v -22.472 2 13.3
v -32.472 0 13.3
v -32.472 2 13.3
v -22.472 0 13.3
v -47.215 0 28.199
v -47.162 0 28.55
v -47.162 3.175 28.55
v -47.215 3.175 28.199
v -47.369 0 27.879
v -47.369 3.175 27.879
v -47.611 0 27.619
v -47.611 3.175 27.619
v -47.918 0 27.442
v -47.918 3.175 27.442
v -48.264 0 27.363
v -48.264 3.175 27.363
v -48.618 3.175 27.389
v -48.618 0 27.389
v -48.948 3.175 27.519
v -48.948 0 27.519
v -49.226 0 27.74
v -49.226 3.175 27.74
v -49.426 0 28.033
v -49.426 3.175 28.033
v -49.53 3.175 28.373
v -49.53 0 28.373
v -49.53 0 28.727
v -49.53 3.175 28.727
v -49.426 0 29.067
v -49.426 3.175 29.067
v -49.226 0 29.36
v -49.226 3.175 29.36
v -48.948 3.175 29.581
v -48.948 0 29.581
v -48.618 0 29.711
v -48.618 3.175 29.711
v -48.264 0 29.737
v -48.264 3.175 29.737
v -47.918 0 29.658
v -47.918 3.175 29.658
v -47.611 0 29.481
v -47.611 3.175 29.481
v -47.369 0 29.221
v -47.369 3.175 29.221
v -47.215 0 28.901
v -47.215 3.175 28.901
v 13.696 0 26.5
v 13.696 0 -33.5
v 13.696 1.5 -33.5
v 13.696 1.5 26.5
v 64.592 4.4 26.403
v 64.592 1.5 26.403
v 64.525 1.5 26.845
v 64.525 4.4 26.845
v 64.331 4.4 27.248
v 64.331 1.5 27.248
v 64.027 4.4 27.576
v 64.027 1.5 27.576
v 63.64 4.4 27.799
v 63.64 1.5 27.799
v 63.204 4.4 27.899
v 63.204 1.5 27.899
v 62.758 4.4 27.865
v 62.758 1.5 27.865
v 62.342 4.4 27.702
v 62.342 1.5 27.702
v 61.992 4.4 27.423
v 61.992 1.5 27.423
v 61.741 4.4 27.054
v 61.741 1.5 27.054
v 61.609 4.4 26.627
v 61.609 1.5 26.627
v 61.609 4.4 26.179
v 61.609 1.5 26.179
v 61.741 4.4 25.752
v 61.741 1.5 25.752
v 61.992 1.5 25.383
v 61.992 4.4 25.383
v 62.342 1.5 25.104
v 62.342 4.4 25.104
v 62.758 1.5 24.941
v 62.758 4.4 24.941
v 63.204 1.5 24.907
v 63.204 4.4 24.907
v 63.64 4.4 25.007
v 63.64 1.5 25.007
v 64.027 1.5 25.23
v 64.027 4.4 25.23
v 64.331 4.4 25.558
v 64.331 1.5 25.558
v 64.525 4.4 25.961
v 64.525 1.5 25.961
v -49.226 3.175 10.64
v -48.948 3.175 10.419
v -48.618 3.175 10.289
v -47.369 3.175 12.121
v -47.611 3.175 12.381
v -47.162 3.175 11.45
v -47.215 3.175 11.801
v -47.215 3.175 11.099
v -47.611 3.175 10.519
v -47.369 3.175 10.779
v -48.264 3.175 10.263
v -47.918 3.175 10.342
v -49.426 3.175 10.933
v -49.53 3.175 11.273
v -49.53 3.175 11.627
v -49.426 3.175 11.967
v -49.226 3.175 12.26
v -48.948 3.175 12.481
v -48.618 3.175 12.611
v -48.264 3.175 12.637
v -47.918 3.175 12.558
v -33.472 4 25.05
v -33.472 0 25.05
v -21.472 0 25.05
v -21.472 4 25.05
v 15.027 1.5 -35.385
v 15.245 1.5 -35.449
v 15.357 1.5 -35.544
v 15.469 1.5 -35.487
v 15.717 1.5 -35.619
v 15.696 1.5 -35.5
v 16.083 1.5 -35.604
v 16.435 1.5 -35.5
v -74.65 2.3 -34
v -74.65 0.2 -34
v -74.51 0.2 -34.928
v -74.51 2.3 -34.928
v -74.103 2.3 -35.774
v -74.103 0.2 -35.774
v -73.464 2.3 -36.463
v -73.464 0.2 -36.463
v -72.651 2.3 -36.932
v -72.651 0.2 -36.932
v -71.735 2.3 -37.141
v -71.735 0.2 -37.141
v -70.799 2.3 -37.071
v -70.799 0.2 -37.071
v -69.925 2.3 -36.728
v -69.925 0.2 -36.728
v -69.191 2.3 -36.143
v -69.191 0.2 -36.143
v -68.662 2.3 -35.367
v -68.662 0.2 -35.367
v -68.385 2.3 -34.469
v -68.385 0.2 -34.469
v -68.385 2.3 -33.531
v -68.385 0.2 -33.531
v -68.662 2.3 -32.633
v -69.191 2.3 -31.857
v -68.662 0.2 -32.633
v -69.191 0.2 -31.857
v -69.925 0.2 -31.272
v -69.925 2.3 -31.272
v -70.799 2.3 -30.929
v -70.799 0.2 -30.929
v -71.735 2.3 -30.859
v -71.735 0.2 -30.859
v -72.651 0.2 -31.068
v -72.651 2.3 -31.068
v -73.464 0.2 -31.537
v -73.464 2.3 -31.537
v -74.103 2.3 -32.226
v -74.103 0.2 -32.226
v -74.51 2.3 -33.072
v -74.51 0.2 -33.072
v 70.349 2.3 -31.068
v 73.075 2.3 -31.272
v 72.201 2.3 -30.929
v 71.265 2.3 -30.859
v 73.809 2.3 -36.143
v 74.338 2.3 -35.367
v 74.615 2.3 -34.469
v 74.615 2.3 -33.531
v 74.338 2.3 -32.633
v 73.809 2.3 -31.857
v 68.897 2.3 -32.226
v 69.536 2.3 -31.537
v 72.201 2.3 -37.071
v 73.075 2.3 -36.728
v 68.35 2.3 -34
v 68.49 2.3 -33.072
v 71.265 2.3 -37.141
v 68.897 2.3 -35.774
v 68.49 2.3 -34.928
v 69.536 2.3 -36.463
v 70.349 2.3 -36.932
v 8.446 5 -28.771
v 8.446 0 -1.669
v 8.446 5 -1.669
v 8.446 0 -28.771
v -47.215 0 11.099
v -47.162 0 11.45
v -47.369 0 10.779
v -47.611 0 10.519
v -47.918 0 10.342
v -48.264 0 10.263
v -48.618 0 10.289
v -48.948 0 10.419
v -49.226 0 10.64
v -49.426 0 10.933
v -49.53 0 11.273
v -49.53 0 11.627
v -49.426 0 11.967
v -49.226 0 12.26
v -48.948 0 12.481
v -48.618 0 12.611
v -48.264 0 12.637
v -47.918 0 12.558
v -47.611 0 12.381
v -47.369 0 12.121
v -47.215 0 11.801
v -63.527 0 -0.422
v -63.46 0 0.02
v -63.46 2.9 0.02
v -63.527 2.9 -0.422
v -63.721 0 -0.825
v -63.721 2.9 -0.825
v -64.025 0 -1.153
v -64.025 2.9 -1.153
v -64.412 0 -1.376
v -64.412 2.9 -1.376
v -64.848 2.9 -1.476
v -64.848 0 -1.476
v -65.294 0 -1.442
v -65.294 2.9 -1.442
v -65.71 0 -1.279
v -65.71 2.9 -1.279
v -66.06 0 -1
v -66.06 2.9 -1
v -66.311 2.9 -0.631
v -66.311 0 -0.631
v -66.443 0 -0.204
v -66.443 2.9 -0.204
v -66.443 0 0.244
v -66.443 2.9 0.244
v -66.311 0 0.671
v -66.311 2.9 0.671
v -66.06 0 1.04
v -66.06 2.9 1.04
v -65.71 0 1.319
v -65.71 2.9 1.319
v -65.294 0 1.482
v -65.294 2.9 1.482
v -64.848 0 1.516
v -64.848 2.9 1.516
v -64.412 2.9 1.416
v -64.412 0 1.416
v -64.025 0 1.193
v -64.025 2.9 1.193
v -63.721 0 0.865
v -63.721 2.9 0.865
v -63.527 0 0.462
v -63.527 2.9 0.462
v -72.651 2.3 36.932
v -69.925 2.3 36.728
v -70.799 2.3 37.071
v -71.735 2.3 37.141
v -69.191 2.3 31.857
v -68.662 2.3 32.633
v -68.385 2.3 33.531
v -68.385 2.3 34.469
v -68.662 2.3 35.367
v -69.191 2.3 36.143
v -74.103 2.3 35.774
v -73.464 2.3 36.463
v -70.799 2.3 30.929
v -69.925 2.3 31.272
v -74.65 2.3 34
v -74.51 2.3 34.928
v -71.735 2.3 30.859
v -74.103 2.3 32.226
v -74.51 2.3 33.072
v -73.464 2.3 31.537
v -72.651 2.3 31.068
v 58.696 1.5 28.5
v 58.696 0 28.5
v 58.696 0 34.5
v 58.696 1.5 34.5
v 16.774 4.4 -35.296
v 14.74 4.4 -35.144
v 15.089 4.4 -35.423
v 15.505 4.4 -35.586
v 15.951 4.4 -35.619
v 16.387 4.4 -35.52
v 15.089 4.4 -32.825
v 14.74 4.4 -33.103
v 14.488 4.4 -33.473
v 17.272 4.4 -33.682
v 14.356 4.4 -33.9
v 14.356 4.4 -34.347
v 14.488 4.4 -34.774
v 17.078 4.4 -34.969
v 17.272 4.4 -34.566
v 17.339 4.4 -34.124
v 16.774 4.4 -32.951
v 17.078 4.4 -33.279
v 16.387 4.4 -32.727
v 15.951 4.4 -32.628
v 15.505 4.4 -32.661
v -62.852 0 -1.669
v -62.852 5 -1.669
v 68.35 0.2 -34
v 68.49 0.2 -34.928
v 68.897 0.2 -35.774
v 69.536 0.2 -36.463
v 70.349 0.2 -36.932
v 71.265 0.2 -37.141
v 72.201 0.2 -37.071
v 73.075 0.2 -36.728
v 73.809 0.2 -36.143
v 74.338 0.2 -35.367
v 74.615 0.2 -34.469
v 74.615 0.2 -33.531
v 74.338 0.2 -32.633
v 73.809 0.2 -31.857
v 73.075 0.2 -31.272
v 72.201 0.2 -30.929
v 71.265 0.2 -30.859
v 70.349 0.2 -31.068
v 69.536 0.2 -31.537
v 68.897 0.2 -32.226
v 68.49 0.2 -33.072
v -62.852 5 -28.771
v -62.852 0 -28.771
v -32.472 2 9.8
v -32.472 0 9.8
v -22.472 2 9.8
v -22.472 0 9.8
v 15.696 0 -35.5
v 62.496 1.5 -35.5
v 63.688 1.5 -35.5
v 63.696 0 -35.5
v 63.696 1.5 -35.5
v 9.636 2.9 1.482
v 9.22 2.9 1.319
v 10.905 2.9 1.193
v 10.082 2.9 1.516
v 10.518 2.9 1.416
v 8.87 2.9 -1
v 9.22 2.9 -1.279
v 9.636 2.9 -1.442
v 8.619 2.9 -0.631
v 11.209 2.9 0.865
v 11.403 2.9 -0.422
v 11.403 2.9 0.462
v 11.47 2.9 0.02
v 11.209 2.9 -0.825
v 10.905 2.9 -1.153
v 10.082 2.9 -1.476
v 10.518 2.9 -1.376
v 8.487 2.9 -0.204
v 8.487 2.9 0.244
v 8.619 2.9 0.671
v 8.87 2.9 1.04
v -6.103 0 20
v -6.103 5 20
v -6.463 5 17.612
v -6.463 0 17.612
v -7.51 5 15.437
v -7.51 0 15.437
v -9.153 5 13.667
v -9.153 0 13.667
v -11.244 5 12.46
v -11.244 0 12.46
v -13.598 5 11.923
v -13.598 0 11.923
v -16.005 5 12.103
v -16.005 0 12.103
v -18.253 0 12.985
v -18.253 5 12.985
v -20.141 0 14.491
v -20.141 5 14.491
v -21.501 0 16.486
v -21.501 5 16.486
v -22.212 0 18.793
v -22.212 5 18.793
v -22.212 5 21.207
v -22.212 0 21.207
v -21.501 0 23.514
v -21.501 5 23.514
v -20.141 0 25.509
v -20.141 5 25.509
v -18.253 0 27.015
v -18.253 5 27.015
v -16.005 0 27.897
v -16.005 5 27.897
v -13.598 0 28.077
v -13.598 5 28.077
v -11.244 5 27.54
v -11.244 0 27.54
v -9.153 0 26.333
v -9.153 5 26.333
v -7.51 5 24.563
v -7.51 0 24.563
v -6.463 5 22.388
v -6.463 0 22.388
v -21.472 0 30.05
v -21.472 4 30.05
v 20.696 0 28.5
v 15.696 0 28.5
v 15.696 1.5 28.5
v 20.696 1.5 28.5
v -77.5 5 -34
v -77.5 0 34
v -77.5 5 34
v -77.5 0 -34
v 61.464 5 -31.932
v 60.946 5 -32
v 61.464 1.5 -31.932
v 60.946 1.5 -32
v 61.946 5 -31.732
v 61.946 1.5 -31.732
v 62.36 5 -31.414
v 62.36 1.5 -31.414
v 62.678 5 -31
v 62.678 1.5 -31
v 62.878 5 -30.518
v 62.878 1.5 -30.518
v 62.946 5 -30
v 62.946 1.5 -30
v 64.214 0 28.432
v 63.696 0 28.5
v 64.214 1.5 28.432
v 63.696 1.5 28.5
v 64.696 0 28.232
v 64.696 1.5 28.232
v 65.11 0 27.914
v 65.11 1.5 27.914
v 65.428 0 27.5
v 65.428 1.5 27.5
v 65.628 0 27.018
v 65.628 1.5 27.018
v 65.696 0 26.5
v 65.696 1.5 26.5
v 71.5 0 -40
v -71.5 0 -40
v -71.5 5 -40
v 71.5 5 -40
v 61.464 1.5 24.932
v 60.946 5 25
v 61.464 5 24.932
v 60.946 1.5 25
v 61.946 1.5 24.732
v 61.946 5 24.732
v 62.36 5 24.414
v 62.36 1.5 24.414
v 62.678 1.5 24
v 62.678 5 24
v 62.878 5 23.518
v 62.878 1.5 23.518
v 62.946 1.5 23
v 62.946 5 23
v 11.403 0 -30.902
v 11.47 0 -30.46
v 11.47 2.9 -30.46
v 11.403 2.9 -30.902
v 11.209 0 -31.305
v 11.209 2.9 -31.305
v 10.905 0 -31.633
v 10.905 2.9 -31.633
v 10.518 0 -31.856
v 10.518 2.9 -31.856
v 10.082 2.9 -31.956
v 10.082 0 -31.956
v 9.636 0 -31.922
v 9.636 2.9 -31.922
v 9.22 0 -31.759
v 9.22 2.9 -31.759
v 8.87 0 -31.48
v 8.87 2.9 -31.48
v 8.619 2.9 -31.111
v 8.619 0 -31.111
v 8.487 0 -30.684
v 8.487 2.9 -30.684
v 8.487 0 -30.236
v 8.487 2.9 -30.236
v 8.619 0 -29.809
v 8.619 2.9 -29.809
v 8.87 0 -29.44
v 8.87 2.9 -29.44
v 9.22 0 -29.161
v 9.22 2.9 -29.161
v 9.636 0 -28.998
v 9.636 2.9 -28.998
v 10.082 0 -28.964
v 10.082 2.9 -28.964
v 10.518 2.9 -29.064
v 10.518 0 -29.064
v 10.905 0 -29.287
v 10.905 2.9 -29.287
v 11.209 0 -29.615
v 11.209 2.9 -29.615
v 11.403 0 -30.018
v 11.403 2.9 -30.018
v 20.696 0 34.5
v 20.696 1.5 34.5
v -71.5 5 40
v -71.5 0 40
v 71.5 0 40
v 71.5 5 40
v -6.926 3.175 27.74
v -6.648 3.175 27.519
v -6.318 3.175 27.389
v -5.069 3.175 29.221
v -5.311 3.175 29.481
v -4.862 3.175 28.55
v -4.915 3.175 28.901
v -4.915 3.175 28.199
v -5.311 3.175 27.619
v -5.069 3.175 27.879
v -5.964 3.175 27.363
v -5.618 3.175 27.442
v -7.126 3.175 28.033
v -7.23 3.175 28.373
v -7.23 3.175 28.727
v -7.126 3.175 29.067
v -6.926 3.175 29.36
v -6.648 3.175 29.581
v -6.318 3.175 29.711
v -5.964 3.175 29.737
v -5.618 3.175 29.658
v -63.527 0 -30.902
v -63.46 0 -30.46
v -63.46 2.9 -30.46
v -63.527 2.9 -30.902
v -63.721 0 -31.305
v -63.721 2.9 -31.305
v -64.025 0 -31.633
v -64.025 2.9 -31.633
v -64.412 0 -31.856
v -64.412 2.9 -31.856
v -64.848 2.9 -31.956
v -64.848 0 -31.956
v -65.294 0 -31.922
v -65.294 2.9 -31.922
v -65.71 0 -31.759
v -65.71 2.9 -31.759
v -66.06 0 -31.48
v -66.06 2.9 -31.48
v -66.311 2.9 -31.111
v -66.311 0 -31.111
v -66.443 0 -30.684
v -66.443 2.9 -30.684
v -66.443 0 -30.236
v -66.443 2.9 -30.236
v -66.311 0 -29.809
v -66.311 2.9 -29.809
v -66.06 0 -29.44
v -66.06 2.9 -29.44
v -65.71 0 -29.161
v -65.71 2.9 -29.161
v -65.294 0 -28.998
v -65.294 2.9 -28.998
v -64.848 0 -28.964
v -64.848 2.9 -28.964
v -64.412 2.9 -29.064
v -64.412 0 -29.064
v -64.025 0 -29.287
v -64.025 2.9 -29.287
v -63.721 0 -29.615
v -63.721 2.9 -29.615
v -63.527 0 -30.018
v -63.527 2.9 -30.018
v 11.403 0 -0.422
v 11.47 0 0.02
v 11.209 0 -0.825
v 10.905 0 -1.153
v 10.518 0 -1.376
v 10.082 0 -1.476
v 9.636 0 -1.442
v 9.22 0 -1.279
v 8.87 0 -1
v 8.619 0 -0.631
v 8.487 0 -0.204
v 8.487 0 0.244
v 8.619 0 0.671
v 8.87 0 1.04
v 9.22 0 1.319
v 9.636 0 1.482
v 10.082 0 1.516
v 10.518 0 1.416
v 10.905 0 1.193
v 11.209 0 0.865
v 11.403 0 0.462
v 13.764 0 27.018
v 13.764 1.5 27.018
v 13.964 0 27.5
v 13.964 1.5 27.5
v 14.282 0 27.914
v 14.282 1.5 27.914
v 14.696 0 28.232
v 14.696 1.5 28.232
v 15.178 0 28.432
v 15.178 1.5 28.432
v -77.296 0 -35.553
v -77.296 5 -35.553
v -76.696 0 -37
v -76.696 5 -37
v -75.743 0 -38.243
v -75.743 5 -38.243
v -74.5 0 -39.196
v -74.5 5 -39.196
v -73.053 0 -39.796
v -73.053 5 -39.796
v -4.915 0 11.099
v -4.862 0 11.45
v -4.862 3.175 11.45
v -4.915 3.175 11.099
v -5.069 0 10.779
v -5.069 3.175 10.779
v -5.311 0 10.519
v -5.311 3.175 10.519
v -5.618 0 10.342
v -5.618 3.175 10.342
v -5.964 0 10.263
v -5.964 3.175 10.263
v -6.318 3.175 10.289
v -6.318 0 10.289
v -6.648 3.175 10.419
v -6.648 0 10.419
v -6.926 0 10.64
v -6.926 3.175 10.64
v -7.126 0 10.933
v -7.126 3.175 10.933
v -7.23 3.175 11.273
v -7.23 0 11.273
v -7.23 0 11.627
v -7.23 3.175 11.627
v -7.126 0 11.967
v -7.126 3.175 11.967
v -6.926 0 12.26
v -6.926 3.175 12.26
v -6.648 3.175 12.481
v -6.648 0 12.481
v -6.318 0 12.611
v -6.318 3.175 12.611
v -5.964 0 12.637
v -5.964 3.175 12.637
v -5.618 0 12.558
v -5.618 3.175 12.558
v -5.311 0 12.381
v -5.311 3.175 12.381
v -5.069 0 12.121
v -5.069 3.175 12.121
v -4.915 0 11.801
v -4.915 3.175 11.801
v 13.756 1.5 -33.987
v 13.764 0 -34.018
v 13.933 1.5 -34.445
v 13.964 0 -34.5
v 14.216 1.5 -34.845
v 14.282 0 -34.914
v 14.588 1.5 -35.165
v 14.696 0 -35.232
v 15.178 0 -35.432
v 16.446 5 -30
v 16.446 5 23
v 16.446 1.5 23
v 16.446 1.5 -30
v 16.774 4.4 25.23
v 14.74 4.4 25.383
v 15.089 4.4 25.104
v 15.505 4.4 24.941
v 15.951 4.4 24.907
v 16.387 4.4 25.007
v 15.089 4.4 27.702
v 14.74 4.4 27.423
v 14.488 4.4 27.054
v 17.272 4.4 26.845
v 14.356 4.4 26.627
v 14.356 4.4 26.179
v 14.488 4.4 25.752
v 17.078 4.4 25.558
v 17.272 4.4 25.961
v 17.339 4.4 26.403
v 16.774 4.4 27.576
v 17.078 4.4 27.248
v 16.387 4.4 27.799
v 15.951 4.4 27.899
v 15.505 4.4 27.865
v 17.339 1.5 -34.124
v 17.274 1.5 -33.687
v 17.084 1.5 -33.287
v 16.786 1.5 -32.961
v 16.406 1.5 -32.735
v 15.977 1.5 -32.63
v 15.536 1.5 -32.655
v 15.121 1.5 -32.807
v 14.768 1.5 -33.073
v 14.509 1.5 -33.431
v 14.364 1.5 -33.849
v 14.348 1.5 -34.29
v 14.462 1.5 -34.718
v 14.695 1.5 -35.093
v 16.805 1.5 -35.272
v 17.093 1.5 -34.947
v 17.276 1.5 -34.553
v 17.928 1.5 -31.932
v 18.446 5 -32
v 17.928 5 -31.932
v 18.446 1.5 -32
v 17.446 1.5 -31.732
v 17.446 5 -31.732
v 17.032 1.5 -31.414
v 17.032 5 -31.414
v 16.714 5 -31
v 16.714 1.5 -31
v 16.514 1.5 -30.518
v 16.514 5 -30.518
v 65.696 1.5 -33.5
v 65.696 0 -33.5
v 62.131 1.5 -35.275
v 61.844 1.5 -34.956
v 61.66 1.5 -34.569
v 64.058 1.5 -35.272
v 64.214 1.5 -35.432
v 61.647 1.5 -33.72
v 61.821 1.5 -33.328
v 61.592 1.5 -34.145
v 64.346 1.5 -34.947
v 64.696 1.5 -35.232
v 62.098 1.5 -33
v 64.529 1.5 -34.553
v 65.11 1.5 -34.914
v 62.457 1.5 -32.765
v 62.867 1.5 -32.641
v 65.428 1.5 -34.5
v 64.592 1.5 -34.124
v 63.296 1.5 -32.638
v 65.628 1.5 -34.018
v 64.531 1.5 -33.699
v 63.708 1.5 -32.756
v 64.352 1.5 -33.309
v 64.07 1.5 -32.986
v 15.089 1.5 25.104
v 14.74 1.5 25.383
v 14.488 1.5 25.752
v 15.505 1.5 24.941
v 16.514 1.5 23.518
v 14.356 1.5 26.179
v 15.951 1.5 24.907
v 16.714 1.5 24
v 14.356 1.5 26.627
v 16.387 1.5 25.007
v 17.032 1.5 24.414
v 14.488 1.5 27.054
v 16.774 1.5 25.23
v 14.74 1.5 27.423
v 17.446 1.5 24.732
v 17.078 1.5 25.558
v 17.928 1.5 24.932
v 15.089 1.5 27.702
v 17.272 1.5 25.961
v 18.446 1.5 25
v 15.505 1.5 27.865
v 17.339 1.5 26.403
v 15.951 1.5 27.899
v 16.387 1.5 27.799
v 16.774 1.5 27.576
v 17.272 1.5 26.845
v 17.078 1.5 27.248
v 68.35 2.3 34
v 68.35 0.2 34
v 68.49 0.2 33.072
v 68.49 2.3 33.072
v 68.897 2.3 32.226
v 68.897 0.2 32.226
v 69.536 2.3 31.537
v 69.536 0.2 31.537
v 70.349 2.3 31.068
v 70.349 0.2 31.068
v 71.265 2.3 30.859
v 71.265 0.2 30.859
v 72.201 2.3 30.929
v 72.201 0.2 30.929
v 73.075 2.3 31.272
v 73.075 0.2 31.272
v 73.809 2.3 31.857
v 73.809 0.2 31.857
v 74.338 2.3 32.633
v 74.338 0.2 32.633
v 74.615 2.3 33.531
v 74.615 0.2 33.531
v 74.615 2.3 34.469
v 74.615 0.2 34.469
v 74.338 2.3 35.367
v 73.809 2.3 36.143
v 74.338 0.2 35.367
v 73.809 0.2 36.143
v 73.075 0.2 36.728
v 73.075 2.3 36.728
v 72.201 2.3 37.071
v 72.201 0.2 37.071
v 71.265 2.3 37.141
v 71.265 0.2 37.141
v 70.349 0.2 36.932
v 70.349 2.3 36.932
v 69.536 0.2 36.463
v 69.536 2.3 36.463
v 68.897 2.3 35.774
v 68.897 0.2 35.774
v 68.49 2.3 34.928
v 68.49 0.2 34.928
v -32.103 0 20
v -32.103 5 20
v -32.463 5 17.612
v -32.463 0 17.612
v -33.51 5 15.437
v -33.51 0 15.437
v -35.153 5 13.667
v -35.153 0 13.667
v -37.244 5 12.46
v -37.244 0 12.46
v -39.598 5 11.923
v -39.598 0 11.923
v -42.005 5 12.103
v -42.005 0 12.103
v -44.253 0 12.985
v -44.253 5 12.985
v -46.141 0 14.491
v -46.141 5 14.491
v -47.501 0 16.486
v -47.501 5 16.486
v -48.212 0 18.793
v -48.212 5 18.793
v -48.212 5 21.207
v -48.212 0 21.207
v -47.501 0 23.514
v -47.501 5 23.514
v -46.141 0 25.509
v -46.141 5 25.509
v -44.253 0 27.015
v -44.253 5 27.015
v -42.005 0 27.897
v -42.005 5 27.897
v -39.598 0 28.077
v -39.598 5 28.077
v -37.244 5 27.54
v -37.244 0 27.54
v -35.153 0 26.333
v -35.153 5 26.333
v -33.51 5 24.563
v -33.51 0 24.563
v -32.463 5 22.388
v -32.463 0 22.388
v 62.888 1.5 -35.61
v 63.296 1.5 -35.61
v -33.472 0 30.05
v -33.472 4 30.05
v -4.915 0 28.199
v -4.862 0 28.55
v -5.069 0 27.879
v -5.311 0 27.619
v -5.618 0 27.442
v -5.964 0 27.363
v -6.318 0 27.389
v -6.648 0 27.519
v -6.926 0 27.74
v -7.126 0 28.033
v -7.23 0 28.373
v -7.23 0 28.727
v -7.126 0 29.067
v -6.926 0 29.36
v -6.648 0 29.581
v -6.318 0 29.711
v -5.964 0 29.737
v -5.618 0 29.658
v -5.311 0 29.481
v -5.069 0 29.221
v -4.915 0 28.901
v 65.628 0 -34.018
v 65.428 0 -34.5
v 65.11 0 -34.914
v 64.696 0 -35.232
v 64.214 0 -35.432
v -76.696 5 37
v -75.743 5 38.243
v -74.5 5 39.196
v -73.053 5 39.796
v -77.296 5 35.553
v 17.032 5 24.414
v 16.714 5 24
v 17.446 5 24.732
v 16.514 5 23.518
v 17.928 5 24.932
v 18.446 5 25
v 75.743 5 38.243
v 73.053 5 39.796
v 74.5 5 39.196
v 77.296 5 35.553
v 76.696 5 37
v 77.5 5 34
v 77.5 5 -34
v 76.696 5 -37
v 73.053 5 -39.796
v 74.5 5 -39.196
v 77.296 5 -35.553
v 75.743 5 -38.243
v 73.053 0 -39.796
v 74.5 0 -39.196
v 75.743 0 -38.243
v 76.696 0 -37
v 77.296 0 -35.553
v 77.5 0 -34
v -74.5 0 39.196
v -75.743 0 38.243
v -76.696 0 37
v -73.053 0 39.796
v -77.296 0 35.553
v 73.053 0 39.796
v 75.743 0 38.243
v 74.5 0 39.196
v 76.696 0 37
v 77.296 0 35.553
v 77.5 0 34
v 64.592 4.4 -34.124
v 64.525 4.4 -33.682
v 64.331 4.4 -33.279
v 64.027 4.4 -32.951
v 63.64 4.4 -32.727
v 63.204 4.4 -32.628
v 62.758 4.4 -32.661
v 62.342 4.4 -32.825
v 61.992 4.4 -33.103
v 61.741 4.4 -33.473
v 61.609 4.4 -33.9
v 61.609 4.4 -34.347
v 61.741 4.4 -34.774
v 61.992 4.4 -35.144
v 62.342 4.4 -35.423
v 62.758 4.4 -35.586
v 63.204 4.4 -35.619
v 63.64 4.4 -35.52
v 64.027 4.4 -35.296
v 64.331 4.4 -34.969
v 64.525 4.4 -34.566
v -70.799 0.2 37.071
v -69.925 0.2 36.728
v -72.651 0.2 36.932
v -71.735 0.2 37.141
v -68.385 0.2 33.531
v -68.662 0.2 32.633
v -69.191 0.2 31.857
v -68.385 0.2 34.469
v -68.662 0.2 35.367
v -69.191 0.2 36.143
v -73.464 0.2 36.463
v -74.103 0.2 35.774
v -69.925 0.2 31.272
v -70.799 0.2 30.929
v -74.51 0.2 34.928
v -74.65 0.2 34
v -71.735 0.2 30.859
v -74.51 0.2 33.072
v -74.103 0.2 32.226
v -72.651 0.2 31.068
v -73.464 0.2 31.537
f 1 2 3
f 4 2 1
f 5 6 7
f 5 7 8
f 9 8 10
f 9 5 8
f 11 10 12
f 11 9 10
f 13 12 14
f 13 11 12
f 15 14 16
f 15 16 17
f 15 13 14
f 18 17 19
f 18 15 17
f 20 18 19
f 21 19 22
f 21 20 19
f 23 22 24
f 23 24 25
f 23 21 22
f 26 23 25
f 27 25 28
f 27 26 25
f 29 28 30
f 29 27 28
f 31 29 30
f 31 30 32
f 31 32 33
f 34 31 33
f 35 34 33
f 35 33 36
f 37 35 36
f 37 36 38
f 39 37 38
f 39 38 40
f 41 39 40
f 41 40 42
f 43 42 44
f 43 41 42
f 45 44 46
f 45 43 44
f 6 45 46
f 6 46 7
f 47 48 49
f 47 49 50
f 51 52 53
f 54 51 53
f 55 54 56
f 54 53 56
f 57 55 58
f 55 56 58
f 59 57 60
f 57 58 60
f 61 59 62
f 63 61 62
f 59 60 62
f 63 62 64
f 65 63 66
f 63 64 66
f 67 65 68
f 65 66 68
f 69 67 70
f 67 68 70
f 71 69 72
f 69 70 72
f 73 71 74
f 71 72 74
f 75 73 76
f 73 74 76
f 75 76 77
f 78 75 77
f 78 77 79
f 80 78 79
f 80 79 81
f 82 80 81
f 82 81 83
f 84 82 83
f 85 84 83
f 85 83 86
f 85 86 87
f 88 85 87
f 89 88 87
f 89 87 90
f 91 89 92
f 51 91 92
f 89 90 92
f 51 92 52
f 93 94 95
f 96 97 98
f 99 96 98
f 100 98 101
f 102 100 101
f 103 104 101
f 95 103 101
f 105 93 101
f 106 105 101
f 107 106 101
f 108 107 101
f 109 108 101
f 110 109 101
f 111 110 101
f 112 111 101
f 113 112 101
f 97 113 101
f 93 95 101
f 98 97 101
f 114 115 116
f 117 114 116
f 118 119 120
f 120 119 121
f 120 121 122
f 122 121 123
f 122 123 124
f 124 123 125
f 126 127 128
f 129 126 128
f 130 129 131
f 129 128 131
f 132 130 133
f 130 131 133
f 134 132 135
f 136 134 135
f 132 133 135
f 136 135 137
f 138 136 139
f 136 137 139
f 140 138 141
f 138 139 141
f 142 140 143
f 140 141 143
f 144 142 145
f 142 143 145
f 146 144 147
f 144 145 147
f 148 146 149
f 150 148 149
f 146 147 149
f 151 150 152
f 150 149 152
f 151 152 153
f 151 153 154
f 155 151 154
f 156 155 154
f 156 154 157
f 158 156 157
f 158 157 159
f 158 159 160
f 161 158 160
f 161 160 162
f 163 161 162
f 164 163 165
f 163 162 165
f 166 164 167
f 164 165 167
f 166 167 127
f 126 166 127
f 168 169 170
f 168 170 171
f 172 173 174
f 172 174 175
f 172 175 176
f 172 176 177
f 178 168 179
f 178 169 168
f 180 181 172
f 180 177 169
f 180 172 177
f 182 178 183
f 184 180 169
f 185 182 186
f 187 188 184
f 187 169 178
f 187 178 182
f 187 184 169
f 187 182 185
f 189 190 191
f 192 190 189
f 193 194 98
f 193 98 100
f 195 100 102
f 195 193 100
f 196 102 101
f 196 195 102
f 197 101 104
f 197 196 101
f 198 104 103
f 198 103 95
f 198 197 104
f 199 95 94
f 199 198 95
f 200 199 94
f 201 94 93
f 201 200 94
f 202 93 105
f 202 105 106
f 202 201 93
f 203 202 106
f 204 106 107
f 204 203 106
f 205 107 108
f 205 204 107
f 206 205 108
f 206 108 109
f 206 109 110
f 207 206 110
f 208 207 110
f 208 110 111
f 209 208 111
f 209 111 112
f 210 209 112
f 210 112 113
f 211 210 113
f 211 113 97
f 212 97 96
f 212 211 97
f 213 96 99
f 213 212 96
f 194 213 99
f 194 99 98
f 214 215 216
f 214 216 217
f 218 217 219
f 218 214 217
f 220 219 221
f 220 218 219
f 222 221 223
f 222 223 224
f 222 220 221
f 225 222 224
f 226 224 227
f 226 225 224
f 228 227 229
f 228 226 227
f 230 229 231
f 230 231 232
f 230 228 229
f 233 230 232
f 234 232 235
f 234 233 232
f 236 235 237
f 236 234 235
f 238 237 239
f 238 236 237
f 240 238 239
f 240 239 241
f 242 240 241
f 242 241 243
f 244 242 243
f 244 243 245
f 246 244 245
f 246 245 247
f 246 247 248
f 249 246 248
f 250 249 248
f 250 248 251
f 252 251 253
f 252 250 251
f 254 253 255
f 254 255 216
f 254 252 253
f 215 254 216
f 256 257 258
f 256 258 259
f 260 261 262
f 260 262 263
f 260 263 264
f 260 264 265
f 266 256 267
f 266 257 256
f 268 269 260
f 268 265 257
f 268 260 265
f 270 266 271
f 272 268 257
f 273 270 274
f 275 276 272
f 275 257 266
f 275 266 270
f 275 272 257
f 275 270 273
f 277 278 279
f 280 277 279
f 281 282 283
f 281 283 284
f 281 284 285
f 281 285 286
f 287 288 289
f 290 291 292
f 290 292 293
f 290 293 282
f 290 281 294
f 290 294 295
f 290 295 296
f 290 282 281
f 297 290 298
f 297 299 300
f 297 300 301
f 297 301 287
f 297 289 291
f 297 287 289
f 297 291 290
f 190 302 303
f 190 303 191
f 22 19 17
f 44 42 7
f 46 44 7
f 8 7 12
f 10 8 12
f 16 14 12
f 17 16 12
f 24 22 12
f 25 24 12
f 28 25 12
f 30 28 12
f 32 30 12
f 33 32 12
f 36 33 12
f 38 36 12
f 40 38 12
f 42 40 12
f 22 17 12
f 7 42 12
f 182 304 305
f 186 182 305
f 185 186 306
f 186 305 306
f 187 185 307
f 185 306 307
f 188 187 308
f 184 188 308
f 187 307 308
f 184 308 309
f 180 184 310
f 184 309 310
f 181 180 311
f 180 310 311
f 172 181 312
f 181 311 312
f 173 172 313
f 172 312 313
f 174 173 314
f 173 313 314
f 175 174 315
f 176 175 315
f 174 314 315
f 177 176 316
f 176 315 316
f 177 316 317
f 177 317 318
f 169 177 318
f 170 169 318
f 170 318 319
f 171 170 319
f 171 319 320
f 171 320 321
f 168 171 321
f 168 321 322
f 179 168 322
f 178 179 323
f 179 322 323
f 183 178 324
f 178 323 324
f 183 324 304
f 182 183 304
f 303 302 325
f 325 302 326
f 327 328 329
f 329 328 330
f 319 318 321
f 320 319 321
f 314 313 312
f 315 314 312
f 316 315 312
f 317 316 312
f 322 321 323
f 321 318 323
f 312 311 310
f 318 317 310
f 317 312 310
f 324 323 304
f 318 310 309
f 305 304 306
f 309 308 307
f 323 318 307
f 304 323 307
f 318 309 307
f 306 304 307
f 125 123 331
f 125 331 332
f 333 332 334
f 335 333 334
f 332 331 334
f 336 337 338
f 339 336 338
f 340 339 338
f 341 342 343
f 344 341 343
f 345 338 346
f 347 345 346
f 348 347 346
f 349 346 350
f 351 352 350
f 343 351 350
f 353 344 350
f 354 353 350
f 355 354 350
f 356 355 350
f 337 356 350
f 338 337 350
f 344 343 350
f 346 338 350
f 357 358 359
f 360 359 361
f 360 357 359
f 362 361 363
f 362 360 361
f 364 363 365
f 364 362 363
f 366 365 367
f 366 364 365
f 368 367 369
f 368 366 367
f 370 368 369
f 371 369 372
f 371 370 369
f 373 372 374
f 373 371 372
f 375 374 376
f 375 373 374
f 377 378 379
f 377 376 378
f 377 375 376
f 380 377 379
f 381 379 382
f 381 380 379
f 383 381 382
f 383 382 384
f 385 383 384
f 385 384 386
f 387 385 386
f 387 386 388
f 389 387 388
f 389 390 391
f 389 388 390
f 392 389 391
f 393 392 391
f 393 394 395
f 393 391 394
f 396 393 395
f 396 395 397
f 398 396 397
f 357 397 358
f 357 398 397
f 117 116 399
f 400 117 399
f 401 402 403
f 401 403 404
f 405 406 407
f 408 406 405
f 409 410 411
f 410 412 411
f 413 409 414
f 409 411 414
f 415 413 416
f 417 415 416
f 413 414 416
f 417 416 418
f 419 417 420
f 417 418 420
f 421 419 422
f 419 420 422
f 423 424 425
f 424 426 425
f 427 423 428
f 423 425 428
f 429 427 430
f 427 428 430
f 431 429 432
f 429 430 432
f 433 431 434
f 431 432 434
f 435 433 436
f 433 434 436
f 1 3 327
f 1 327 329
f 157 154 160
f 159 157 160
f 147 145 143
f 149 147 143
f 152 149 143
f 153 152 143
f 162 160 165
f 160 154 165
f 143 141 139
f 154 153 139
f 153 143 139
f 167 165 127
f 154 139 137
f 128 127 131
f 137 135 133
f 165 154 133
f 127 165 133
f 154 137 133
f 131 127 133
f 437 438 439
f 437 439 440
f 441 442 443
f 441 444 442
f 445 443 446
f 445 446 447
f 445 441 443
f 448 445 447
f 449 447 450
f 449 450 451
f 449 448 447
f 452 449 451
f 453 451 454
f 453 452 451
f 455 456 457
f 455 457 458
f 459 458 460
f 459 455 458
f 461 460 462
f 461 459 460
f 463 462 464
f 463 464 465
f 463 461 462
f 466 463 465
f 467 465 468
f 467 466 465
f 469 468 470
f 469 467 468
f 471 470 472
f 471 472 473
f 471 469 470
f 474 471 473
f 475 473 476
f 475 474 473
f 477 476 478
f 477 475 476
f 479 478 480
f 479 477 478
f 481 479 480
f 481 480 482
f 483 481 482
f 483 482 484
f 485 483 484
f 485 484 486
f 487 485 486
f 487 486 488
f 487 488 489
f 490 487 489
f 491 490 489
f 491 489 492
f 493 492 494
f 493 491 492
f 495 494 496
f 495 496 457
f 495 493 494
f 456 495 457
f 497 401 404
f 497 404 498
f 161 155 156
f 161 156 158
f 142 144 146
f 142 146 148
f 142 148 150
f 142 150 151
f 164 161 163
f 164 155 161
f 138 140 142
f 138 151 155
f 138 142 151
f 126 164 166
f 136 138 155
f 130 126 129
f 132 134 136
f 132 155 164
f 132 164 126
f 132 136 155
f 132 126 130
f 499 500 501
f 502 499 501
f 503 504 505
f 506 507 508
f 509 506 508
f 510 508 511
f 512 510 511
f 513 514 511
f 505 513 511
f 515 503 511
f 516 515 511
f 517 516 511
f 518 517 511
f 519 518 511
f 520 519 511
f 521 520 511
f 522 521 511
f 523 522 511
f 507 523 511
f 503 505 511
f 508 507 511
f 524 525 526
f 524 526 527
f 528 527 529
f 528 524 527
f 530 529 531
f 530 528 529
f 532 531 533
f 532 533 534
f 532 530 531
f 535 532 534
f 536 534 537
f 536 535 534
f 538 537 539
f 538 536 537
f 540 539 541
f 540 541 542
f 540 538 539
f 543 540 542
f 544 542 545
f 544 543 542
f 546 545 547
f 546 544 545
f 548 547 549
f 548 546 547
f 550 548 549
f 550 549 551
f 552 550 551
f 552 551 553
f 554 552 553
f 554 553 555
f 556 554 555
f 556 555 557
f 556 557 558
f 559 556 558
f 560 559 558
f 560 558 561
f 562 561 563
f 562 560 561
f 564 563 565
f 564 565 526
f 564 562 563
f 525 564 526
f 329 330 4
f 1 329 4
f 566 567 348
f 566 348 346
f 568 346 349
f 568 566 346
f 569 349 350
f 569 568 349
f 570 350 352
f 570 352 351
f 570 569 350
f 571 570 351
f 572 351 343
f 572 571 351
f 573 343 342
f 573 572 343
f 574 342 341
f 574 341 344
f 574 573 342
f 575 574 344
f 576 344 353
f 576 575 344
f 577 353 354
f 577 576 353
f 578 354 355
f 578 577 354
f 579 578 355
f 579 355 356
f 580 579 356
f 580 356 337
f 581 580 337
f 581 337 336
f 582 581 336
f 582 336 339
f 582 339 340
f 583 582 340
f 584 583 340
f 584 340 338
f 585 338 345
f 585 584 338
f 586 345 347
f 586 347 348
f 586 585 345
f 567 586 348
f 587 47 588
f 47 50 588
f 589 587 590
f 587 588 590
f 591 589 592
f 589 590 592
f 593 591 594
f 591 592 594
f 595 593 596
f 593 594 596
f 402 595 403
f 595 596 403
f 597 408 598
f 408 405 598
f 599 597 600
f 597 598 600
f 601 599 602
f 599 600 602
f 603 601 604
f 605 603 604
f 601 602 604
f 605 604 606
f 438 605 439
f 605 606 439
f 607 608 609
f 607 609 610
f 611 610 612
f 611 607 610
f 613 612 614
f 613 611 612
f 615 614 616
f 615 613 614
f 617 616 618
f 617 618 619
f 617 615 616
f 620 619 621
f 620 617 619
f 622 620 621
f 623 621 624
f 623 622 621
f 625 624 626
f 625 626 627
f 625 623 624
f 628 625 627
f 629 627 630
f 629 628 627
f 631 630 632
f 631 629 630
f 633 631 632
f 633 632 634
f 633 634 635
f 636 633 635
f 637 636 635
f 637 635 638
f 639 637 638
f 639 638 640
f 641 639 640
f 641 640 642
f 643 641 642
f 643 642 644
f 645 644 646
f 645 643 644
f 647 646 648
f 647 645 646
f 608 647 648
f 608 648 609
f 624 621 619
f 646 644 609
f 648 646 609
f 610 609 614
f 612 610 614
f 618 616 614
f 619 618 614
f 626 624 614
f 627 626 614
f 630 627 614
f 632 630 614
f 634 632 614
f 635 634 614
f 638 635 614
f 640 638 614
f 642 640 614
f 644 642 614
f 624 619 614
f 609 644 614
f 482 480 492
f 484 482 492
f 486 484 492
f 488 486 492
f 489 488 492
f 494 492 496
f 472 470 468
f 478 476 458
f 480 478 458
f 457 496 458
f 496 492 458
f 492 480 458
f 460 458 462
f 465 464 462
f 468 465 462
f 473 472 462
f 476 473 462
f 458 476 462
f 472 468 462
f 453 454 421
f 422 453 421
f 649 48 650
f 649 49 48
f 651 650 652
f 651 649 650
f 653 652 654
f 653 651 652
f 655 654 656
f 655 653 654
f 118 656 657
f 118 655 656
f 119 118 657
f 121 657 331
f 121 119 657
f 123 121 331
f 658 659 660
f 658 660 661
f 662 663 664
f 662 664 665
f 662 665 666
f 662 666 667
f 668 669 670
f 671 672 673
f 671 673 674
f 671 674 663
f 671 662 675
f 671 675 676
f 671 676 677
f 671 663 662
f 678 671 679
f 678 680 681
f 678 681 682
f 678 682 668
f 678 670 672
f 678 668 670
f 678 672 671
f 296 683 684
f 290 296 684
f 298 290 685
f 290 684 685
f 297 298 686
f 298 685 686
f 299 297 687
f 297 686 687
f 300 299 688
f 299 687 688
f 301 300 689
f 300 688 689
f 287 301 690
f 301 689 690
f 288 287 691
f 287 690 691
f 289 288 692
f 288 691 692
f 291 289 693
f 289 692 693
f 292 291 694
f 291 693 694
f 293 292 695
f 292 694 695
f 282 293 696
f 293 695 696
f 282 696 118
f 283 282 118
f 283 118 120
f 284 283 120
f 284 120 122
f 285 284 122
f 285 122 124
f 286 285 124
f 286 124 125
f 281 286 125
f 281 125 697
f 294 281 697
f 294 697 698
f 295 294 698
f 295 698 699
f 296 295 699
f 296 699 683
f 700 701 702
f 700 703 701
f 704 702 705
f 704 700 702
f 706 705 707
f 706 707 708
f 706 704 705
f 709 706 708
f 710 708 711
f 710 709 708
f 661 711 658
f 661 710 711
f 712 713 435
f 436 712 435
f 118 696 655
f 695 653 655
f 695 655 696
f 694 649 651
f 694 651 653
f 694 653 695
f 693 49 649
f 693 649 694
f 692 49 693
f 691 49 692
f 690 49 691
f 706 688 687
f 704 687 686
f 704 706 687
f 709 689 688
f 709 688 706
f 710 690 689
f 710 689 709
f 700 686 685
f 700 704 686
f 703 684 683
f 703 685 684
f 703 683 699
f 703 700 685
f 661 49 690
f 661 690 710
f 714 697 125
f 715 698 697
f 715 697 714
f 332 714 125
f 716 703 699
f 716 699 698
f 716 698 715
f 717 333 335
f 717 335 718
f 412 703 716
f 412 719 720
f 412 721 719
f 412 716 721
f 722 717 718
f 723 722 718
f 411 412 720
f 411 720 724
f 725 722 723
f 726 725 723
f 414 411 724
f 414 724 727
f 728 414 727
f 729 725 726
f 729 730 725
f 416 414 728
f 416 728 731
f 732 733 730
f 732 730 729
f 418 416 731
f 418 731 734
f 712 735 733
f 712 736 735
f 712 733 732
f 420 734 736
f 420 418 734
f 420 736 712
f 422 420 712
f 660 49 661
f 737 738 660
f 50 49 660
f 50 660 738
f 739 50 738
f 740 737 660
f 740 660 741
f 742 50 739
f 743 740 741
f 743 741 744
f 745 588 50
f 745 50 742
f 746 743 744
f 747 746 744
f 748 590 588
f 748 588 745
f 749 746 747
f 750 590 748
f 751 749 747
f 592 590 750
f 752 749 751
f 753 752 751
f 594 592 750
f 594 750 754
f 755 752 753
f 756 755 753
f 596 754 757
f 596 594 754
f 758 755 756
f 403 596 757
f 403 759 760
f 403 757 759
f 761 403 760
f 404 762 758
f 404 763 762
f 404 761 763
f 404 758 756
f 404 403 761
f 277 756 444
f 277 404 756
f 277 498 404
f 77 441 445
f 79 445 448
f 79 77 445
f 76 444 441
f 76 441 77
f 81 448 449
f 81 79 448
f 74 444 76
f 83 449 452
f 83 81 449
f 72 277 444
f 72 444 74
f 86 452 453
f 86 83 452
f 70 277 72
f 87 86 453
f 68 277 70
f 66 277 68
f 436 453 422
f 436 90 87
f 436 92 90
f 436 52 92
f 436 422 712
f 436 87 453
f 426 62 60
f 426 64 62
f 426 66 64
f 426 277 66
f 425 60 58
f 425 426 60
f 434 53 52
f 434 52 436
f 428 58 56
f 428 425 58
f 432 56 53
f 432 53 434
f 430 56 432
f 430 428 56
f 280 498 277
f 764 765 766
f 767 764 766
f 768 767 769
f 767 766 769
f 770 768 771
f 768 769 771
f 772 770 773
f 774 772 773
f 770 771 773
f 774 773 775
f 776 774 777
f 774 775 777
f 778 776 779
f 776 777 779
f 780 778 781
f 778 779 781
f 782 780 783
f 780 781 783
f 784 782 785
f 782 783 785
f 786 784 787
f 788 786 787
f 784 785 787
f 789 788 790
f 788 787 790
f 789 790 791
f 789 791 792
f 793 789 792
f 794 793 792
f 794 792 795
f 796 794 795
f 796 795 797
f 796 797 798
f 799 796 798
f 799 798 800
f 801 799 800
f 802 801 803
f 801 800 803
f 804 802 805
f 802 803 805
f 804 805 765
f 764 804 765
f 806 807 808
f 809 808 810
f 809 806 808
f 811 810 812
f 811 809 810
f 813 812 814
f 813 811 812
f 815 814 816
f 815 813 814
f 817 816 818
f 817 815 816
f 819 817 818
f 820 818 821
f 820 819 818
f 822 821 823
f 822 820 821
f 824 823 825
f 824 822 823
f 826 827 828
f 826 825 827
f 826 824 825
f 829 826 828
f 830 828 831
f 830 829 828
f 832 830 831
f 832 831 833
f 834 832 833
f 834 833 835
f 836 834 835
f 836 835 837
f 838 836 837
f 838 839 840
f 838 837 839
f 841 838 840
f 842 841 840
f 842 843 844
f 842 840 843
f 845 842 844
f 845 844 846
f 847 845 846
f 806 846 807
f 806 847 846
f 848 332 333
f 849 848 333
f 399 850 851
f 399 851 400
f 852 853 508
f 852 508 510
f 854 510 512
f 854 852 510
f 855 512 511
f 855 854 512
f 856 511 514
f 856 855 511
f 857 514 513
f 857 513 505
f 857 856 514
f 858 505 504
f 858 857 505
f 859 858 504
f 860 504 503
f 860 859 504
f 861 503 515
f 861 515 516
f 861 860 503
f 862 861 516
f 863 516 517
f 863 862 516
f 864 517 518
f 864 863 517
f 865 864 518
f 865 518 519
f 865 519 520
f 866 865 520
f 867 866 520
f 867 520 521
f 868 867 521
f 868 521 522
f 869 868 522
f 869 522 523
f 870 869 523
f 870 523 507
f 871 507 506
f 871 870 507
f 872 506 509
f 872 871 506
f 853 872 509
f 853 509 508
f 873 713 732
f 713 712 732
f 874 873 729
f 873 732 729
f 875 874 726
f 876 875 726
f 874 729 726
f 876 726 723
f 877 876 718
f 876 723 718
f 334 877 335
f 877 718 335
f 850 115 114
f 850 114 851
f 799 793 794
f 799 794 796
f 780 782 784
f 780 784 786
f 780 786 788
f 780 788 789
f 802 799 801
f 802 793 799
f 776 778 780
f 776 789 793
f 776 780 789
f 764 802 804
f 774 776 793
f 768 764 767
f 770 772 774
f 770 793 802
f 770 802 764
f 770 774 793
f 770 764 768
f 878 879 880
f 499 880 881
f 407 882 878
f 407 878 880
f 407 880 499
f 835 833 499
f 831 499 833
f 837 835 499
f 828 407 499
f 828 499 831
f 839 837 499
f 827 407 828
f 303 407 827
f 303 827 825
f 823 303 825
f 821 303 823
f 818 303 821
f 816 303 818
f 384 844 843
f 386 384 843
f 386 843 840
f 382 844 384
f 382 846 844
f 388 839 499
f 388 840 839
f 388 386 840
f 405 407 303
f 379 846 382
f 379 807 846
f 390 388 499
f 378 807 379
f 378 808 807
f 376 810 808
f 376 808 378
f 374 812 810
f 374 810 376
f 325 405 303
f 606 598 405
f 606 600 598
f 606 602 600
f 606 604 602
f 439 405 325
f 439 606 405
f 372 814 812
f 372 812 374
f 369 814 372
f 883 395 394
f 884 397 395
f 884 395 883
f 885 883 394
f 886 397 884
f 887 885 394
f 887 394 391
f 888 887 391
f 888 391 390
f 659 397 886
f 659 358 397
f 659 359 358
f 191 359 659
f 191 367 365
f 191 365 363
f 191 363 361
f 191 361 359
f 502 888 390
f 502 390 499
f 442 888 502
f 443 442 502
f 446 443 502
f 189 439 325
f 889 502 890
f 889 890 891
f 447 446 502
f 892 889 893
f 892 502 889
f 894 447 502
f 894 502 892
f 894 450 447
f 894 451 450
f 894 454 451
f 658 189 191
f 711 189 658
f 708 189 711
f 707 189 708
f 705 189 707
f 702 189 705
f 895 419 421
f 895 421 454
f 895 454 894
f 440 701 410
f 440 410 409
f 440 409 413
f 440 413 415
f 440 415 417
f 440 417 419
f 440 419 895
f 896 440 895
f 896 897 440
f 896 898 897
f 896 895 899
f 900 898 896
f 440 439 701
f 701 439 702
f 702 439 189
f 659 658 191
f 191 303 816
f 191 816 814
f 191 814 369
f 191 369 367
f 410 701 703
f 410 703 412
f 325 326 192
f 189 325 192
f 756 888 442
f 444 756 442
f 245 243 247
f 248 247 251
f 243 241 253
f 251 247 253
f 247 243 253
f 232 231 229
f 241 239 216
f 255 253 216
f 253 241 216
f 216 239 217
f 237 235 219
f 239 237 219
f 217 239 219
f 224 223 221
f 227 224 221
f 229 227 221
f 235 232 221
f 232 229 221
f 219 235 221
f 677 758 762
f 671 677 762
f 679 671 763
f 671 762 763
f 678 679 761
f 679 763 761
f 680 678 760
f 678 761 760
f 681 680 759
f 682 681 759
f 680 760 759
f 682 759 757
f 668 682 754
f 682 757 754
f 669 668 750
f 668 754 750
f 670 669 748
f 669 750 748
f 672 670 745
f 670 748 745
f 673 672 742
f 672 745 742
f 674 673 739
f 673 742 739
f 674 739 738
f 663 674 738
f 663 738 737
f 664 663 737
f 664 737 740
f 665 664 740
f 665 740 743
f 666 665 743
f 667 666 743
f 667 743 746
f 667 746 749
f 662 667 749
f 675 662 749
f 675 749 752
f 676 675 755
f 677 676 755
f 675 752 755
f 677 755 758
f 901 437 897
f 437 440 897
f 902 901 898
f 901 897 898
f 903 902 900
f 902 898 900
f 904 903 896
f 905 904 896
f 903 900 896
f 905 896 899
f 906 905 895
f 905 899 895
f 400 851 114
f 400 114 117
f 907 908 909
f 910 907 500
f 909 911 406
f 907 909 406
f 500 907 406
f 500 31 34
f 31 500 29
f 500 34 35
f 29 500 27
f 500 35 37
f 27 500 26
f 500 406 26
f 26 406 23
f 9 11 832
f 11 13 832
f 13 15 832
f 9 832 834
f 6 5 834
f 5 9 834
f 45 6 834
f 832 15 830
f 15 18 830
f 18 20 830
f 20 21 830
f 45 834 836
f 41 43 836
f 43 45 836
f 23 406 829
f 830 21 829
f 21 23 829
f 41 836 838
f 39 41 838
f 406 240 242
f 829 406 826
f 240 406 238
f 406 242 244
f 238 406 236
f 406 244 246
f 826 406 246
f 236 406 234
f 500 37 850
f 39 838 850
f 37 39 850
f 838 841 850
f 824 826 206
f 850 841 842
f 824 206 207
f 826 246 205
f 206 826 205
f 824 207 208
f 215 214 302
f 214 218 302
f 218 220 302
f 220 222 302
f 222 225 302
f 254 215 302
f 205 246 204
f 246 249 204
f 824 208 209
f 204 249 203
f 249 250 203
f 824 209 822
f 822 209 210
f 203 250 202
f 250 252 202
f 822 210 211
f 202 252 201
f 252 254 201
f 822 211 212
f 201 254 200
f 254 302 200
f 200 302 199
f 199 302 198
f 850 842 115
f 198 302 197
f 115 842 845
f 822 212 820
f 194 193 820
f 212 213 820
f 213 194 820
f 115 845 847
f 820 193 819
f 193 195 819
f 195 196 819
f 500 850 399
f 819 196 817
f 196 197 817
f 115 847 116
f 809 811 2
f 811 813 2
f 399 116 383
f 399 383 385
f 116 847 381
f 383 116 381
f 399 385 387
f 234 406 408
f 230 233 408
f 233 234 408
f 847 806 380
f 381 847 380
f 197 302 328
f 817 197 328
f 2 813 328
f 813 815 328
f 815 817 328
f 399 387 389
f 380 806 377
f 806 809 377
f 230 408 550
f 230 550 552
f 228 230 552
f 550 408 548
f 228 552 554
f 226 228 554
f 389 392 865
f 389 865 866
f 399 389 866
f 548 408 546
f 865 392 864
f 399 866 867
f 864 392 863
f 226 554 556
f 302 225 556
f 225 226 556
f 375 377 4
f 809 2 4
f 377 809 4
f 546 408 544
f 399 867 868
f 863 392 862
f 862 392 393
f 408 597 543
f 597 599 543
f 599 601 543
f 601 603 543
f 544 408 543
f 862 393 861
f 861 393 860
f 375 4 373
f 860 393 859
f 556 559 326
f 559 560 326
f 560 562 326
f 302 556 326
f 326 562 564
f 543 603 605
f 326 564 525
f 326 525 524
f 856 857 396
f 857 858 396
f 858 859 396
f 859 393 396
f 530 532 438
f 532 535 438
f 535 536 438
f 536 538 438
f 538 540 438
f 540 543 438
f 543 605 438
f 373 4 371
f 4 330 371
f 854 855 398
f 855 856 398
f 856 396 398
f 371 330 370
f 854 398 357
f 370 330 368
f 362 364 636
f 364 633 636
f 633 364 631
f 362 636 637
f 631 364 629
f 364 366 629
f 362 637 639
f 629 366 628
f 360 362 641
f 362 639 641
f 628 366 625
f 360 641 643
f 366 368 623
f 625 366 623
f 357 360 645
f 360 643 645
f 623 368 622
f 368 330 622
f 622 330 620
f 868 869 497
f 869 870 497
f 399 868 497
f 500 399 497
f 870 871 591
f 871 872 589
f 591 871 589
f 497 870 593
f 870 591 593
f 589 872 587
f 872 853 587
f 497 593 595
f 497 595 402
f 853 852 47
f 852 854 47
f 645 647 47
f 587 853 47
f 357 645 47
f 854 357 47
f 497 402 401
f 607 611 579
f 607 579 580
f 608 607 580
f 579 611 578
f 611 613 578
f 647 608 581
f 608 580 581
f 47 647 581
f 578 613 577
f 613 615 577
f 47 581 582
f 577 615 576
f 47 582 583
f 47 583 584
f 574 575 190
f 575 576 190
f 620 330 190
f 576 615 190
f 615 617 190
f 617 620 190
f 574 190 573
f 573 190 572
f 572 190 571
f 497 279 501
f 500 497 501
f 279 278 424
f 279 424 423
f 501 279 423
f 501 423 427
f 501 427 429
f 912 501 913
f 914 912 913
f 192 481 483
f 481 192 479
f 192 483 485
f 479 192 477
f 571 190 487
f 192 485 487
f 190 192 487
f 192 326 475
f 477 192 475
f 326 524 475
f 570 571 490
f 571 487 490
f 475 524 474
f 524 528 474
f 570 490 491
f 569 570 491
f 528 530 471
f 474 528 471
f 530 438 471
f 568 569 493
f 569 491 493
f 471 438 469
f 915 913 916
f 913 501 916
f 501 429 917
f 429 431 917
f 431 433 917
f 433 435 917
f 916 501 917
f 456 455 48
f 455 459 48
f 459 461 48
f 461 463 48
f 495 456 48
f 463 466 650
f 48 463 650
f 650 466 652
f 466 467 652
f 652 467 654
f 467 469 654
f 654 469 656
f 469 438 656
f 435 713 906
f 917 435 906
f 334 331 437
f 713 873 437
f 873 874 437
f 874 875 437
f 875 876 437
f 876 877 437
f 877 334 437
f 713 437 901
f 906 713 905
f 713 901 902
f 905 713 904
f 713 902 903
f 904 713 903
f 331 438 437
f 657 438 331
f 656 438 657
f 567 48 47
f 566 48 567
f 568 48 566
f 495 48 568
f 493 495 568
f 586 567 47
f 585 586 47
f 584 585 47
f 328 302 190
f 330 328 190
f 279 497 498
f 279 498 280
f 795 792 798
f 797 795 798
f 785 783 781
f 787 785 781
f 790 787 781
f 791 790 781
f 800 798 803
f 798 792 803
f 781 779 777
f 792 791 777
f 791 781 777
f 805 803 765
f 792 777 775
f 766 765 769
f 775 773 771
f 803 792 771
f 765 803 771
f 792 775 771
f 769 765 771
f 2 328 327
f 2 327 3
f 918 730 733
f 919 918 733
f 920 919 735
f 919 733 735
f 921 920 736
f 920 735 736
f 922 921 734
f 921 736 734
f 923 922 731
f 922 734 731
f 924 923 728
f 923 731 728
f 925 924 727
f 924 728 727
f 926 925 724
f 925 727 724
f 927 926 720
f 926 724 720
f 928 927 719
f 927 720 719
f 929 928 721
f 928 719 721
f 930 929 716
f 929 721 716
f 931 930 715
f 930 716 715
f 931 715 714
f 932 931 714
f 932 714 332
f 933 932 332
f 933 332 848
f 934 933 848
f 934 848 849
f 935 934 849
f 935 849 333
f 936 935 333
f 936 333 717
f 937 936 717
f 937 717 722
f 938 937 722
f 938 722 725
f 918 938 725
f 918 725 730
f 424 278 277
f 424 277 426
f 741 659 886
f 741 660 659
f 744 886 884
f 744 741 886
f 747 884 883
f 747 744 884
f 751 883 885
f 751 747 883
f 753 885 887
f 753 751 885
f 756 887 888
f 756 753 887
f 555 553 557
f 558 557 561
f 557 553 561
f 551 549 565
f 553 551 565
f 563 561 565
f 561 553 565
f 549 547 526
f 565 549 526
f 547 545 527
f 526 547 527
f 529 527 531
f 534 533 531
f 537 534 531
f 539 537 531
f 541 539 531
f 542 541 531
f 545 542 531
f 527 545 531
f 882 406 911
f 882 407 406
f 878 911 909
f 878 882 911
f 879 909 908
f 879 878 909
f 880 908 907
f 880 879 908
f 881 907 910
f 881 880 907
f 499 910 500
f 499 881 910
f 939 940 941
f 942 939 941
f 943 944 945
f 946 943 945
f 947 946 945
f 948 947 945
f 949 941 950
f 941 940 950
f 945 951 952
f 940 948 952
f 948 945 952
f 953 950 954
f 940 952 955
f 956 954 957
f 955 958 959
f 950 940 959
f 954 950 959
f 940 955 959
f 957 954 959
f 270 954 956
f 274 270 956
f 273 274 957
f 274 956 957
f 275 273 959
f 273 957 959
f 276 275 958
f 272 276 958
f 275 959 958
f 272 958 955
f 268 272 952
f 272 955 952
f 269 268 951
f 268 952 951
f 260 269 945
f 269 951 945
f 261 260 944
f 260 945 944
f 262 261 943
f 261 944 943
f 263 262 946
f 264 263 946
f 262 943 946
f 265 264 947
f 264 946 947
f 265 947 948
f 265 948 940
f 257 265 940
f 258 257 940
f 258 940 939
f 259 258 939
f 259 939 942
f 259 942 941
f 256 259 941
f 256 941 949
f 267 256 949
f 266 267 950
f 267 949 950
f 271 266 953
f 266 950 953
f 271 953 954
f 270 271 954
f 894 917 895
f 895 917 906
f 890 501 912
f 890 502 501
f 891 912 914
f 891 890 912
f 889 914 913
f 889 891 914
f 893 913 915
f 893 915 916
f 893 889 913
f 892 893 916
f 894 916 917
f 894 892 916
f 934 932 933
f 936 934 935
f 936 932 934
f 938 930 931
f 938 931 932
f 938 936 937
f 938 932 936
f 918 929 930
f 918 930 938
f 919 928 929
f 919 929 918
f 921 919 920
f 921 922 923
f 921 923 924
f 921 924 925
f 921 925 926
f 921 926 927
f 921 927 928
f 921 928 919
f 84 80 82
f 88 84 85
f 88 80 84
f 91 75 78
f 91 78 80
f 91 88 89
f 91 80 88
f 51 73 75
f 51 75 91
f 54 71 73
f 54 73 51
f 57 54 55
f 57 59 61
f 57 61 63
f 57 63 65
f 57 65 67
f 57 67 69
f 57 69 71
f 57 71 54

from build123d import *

# Parameters (mm, degrees)
SKETCH1_W                = 155
SKETCH1_H                = 80
BOSS_EXTRUDE1_DEPTH      = 5
SKETCH2_W                = 71.2978
SKETCH2_H                = 27.1018
SCREEN_CUTOUT_DEPTH      = 88.357026048
SKETCH2_3_R              = 1.5
SKETCH2_3_W              = 71.2978
SKETCH2_3_H              = 27.1018
CUT_EXTRUDE4_DEPTH       = 2.9
SKETCH3_R                = 8.1
ULTRASOUND_CUTOUTS_DEPTH = 88.357026048
SKETCH3_3_R              = 8.1
SKETCH3_3_R_2            = 1.190625
CUT_EXTRUDE2_DEPTH       = 3.175
SKETCH5_W                = 12
SKETCH5_H                = 5
US_CLOCK_CUTOUT_DEPTH    = 4
SKETCH6_W                = 10
SKETCH6_H                = 3.5
US_PIN_CUTOUT_DEPTH      = 2
SKETCH9_R                = 3.15
MAGNET_HOLES_DEPTH       = 2.1
FILLET1_R                = 6
SKETCH10_W               = 46.5
SKETCH10_H               = 57
KEYPAD_CUTOUT_DEPTH      = 88.357026048
CUT_EXTRUDE1_DEPTH       = 1.5
FILLET3_R                = 2
FILLET4_R                = 2
SKETCH12_R               = 1.5
CUT_EXTRUDE3_DEPTH       = 2.9


with BuildPart() as part:
    # Sketch1 → Boss-Extrude1 (new body)
    with BuildSketch(Plane(origin=(0, 0, 0), x_dir=(1, 0, 0), z_dir=(0, 1, 0))):
        Rectangle(SKETCH1_W, SKETCH1_H)
    extrude(amount=BOSS_EXTRUDE1_DEPTH)

    # Sketch2 → Screen Cutout (cut, through all)
    with BuildSketch(Plane(origin=(0, 0, 0), x_dir=(1, 0, 0), z_dir=(0, 1, 0))):
        with Locations((-27.2029, 15.22)):
            Rectangle(SKETCH2_W, SKETCH2_H)
    extrude(amount=SCREEN_CUTOUT_DEPTH, mode=Mode.SUBTRACT)

    # Sketch2<3> → Cut-Extrude4 (cut)
    with BuildSketch(Plane(origin=(0, 0, 0), x_dir=(1, 0, 0), z_dir=(0, 1, 0))):
        with Locations((-64.96, -0.02)):
            Circle(SKETCH2_3_R)
        with Locations((9.97, -0.02)):
            Circle(SKETCH2_3_R)
        with Locations((9.97, 30.46)):
            Circle(SKETCH2_3_R)
        with Locations((-64.96, 30.46)):
            Circle(SKETCH2_3_R)
        with Locations((-27.2029, 15.22)):
            Rectangle(SKETCH2_3_W, SKETCH2_3_H)
    extrude(amount=CUT_EXTRUDE4_DEPTH, mode=Mode.SUBTRACT)

    # Sketch3 → Ultrasound Cutouts (cut, through all)
    with BuildSketch(Plane(origin=(0, 0, 0), x_dir=(1, 0, 0), z_dir=(0, 1, 0))):
        with Locations((-40.2029, -20)):
            Circle(SKETCH3_R)
        with Locations((-14.2029, -20)):
            Circle(SKETCH3_R)
    extrude(amount=ULTRASOUND_CUTOUTS_DEPTH, mode=Mode.SUBTRACT)

    # Sketch3<3> → Cut-Extrude2 (cut)
    with BuildSketch(Plane(origin=(0, 0, 0), x_dir=(1, 0, 0), z_dir=(0, 1, 0))):
        with Locations((-40.2029, -20)):
            Circle(SKETCH3_3_R)
        with Locations((-14.2029, -20)):
            Circle(SKETCH3_3_R)
        with Locations((-48.3529, -11.45)):
            Circle(SKETCH3_3_R_2)
        with Locations((-6.0529, -11.45)):
            Circle(SKETCH3_3_R_2)
        with Locations((-6.0529, -28.55)):
            Circle(SKETCH3_3_R_2)
        with Locations((-48.3529, -28.55)):
            Circle(SKETCH3_3_R_2)
    extrude(amount=CUT_EXTRUDE2_DEPTH, mode=Mode.SUBTRACT)

    # Sketch5 → US Clock cutout (cut)
    with BuildSketch(Plane.XZ):
        with Locations((-27.471992442, 27.55)):
            Rectangle(SKETCH5_W, SKETCH5_H)
    extrude(amount=-US_CLOCK_CUTOUT_DEPTH, mode=Mode.SUBTRACT)

    # Sketch6 → US Pin cutout (cut)
    with BuildSketch(Plane.XZ):
        with Locations((-27.471992442, 11.55)):
            Rectangle(SKETCH6_W, SKETCH6_H)
    extrude(amount=-US_PIN_CUTOUT_DEPTH, mode=Mode.SUBTRACT)

    # Sketch9 → Magnet Holes (cut)
    with BuildSketch(Plane(origin=(0, 0.2, 0), x_dir=(-1, 0, 0), z_dir=(0, -1, 0))):
        with Locations((-71.5, 34)):
            Circle(SKETCH9_R)
        with Locations((71.5, 34)):
            Circle(SKETCH9_R)
        with Locations((-71.5, -34)):
            Circle(SKETCH9_R)
        with Locations((71.5, -34)):
            Circle(SKETCH9_R)
    extrude(amount=-MAGNET_HOLES_DEPTH, mode=Mode.SUBTRACT)

    # Fillet1
    fillet1_edges = [part.edges().sort_by_distance(p)[0] for p in [
        (77.5, 2.5, -40),
        (77.5, 2.5, 40),
        (-77.5, 2.5, 40),
        (-77.5, 2.5, -40),
    ]]
    fillet(fillet1_edges, radius=FILLET1_R)

    # Sketch10 → Keypad cutout (cut, through all)
    with BuildSketch(Plane(origin=(0, 5, 0), x_dir=(1, 0, 0), z_dir=(0, 1, 0))):
        with Locations((39.696, 3.5)):
            Rectangle(SKETCH10_W, SKETCH10_H)
    extrude(amount=-KEYPAD_CUTOUT_DEPTH, mode=Mode.SUBTRACT)

    # Sketch11 → Cut-Extrude1 (cut)
    with BuildSketch(Plane.XZ):
        Polygon((58.696, 28.5), (58.696, 34.5), (20.696, 34.5), (20.696, 28.5), (13.696, 28.5), (13.696, -35.5), (65.696, -35.5), (65.696, 28.5), align=None)
    extrude(amount=-CUT_EXTRUDE1_DEPTH, mode=Mode.SUBTRACT)

    # Fillet3
    fillet3_edges = [part.edges().sort_by_distance(p)[0] for p in [
        (65.696, 0.75, 28.5),
        (13.696, 0.75, 28.5),
        (13.696, 0.75, -35.5),
        (65.696, 0.75, -35.5),
    ]]
    fillet(fillet3_edges, radius=FILLET3_R)

    # Fillet4
    fillet4_edges = [part.edges().sort_by_distance(p)[0] for p in [
        (62.946, 3.25, 25),
        (16.446, 3.25, 25),
        (16.446, 3.25, -32),
        (62.946, 3.25, -32),
    ]]
    fillet(fillet4_edges, radius=FILLET4_R)

    # Sketch12 → Cut-Extrude3 (cut)
    with BuildSketch(Plane.XZ.offset(-1.5)):
        with Locations((63.092012723, -34.123666466)):
            Circle(SKETCH12_R)
        with Locations((15.839087894, -34.123666466)):
            Circle(SKETCH12_R)
        with Locations((15.839087894, 26.403006737)):
            Circle(SKETCH12_R)
        with Locations((63.092012723, 26.403006737)):
            Circle(SKETCH12_R)
    extrude(amount=-CUT_EXTRUDE3_DEPTH, mode=Mode.SUBTRACT)


solid = part.part
